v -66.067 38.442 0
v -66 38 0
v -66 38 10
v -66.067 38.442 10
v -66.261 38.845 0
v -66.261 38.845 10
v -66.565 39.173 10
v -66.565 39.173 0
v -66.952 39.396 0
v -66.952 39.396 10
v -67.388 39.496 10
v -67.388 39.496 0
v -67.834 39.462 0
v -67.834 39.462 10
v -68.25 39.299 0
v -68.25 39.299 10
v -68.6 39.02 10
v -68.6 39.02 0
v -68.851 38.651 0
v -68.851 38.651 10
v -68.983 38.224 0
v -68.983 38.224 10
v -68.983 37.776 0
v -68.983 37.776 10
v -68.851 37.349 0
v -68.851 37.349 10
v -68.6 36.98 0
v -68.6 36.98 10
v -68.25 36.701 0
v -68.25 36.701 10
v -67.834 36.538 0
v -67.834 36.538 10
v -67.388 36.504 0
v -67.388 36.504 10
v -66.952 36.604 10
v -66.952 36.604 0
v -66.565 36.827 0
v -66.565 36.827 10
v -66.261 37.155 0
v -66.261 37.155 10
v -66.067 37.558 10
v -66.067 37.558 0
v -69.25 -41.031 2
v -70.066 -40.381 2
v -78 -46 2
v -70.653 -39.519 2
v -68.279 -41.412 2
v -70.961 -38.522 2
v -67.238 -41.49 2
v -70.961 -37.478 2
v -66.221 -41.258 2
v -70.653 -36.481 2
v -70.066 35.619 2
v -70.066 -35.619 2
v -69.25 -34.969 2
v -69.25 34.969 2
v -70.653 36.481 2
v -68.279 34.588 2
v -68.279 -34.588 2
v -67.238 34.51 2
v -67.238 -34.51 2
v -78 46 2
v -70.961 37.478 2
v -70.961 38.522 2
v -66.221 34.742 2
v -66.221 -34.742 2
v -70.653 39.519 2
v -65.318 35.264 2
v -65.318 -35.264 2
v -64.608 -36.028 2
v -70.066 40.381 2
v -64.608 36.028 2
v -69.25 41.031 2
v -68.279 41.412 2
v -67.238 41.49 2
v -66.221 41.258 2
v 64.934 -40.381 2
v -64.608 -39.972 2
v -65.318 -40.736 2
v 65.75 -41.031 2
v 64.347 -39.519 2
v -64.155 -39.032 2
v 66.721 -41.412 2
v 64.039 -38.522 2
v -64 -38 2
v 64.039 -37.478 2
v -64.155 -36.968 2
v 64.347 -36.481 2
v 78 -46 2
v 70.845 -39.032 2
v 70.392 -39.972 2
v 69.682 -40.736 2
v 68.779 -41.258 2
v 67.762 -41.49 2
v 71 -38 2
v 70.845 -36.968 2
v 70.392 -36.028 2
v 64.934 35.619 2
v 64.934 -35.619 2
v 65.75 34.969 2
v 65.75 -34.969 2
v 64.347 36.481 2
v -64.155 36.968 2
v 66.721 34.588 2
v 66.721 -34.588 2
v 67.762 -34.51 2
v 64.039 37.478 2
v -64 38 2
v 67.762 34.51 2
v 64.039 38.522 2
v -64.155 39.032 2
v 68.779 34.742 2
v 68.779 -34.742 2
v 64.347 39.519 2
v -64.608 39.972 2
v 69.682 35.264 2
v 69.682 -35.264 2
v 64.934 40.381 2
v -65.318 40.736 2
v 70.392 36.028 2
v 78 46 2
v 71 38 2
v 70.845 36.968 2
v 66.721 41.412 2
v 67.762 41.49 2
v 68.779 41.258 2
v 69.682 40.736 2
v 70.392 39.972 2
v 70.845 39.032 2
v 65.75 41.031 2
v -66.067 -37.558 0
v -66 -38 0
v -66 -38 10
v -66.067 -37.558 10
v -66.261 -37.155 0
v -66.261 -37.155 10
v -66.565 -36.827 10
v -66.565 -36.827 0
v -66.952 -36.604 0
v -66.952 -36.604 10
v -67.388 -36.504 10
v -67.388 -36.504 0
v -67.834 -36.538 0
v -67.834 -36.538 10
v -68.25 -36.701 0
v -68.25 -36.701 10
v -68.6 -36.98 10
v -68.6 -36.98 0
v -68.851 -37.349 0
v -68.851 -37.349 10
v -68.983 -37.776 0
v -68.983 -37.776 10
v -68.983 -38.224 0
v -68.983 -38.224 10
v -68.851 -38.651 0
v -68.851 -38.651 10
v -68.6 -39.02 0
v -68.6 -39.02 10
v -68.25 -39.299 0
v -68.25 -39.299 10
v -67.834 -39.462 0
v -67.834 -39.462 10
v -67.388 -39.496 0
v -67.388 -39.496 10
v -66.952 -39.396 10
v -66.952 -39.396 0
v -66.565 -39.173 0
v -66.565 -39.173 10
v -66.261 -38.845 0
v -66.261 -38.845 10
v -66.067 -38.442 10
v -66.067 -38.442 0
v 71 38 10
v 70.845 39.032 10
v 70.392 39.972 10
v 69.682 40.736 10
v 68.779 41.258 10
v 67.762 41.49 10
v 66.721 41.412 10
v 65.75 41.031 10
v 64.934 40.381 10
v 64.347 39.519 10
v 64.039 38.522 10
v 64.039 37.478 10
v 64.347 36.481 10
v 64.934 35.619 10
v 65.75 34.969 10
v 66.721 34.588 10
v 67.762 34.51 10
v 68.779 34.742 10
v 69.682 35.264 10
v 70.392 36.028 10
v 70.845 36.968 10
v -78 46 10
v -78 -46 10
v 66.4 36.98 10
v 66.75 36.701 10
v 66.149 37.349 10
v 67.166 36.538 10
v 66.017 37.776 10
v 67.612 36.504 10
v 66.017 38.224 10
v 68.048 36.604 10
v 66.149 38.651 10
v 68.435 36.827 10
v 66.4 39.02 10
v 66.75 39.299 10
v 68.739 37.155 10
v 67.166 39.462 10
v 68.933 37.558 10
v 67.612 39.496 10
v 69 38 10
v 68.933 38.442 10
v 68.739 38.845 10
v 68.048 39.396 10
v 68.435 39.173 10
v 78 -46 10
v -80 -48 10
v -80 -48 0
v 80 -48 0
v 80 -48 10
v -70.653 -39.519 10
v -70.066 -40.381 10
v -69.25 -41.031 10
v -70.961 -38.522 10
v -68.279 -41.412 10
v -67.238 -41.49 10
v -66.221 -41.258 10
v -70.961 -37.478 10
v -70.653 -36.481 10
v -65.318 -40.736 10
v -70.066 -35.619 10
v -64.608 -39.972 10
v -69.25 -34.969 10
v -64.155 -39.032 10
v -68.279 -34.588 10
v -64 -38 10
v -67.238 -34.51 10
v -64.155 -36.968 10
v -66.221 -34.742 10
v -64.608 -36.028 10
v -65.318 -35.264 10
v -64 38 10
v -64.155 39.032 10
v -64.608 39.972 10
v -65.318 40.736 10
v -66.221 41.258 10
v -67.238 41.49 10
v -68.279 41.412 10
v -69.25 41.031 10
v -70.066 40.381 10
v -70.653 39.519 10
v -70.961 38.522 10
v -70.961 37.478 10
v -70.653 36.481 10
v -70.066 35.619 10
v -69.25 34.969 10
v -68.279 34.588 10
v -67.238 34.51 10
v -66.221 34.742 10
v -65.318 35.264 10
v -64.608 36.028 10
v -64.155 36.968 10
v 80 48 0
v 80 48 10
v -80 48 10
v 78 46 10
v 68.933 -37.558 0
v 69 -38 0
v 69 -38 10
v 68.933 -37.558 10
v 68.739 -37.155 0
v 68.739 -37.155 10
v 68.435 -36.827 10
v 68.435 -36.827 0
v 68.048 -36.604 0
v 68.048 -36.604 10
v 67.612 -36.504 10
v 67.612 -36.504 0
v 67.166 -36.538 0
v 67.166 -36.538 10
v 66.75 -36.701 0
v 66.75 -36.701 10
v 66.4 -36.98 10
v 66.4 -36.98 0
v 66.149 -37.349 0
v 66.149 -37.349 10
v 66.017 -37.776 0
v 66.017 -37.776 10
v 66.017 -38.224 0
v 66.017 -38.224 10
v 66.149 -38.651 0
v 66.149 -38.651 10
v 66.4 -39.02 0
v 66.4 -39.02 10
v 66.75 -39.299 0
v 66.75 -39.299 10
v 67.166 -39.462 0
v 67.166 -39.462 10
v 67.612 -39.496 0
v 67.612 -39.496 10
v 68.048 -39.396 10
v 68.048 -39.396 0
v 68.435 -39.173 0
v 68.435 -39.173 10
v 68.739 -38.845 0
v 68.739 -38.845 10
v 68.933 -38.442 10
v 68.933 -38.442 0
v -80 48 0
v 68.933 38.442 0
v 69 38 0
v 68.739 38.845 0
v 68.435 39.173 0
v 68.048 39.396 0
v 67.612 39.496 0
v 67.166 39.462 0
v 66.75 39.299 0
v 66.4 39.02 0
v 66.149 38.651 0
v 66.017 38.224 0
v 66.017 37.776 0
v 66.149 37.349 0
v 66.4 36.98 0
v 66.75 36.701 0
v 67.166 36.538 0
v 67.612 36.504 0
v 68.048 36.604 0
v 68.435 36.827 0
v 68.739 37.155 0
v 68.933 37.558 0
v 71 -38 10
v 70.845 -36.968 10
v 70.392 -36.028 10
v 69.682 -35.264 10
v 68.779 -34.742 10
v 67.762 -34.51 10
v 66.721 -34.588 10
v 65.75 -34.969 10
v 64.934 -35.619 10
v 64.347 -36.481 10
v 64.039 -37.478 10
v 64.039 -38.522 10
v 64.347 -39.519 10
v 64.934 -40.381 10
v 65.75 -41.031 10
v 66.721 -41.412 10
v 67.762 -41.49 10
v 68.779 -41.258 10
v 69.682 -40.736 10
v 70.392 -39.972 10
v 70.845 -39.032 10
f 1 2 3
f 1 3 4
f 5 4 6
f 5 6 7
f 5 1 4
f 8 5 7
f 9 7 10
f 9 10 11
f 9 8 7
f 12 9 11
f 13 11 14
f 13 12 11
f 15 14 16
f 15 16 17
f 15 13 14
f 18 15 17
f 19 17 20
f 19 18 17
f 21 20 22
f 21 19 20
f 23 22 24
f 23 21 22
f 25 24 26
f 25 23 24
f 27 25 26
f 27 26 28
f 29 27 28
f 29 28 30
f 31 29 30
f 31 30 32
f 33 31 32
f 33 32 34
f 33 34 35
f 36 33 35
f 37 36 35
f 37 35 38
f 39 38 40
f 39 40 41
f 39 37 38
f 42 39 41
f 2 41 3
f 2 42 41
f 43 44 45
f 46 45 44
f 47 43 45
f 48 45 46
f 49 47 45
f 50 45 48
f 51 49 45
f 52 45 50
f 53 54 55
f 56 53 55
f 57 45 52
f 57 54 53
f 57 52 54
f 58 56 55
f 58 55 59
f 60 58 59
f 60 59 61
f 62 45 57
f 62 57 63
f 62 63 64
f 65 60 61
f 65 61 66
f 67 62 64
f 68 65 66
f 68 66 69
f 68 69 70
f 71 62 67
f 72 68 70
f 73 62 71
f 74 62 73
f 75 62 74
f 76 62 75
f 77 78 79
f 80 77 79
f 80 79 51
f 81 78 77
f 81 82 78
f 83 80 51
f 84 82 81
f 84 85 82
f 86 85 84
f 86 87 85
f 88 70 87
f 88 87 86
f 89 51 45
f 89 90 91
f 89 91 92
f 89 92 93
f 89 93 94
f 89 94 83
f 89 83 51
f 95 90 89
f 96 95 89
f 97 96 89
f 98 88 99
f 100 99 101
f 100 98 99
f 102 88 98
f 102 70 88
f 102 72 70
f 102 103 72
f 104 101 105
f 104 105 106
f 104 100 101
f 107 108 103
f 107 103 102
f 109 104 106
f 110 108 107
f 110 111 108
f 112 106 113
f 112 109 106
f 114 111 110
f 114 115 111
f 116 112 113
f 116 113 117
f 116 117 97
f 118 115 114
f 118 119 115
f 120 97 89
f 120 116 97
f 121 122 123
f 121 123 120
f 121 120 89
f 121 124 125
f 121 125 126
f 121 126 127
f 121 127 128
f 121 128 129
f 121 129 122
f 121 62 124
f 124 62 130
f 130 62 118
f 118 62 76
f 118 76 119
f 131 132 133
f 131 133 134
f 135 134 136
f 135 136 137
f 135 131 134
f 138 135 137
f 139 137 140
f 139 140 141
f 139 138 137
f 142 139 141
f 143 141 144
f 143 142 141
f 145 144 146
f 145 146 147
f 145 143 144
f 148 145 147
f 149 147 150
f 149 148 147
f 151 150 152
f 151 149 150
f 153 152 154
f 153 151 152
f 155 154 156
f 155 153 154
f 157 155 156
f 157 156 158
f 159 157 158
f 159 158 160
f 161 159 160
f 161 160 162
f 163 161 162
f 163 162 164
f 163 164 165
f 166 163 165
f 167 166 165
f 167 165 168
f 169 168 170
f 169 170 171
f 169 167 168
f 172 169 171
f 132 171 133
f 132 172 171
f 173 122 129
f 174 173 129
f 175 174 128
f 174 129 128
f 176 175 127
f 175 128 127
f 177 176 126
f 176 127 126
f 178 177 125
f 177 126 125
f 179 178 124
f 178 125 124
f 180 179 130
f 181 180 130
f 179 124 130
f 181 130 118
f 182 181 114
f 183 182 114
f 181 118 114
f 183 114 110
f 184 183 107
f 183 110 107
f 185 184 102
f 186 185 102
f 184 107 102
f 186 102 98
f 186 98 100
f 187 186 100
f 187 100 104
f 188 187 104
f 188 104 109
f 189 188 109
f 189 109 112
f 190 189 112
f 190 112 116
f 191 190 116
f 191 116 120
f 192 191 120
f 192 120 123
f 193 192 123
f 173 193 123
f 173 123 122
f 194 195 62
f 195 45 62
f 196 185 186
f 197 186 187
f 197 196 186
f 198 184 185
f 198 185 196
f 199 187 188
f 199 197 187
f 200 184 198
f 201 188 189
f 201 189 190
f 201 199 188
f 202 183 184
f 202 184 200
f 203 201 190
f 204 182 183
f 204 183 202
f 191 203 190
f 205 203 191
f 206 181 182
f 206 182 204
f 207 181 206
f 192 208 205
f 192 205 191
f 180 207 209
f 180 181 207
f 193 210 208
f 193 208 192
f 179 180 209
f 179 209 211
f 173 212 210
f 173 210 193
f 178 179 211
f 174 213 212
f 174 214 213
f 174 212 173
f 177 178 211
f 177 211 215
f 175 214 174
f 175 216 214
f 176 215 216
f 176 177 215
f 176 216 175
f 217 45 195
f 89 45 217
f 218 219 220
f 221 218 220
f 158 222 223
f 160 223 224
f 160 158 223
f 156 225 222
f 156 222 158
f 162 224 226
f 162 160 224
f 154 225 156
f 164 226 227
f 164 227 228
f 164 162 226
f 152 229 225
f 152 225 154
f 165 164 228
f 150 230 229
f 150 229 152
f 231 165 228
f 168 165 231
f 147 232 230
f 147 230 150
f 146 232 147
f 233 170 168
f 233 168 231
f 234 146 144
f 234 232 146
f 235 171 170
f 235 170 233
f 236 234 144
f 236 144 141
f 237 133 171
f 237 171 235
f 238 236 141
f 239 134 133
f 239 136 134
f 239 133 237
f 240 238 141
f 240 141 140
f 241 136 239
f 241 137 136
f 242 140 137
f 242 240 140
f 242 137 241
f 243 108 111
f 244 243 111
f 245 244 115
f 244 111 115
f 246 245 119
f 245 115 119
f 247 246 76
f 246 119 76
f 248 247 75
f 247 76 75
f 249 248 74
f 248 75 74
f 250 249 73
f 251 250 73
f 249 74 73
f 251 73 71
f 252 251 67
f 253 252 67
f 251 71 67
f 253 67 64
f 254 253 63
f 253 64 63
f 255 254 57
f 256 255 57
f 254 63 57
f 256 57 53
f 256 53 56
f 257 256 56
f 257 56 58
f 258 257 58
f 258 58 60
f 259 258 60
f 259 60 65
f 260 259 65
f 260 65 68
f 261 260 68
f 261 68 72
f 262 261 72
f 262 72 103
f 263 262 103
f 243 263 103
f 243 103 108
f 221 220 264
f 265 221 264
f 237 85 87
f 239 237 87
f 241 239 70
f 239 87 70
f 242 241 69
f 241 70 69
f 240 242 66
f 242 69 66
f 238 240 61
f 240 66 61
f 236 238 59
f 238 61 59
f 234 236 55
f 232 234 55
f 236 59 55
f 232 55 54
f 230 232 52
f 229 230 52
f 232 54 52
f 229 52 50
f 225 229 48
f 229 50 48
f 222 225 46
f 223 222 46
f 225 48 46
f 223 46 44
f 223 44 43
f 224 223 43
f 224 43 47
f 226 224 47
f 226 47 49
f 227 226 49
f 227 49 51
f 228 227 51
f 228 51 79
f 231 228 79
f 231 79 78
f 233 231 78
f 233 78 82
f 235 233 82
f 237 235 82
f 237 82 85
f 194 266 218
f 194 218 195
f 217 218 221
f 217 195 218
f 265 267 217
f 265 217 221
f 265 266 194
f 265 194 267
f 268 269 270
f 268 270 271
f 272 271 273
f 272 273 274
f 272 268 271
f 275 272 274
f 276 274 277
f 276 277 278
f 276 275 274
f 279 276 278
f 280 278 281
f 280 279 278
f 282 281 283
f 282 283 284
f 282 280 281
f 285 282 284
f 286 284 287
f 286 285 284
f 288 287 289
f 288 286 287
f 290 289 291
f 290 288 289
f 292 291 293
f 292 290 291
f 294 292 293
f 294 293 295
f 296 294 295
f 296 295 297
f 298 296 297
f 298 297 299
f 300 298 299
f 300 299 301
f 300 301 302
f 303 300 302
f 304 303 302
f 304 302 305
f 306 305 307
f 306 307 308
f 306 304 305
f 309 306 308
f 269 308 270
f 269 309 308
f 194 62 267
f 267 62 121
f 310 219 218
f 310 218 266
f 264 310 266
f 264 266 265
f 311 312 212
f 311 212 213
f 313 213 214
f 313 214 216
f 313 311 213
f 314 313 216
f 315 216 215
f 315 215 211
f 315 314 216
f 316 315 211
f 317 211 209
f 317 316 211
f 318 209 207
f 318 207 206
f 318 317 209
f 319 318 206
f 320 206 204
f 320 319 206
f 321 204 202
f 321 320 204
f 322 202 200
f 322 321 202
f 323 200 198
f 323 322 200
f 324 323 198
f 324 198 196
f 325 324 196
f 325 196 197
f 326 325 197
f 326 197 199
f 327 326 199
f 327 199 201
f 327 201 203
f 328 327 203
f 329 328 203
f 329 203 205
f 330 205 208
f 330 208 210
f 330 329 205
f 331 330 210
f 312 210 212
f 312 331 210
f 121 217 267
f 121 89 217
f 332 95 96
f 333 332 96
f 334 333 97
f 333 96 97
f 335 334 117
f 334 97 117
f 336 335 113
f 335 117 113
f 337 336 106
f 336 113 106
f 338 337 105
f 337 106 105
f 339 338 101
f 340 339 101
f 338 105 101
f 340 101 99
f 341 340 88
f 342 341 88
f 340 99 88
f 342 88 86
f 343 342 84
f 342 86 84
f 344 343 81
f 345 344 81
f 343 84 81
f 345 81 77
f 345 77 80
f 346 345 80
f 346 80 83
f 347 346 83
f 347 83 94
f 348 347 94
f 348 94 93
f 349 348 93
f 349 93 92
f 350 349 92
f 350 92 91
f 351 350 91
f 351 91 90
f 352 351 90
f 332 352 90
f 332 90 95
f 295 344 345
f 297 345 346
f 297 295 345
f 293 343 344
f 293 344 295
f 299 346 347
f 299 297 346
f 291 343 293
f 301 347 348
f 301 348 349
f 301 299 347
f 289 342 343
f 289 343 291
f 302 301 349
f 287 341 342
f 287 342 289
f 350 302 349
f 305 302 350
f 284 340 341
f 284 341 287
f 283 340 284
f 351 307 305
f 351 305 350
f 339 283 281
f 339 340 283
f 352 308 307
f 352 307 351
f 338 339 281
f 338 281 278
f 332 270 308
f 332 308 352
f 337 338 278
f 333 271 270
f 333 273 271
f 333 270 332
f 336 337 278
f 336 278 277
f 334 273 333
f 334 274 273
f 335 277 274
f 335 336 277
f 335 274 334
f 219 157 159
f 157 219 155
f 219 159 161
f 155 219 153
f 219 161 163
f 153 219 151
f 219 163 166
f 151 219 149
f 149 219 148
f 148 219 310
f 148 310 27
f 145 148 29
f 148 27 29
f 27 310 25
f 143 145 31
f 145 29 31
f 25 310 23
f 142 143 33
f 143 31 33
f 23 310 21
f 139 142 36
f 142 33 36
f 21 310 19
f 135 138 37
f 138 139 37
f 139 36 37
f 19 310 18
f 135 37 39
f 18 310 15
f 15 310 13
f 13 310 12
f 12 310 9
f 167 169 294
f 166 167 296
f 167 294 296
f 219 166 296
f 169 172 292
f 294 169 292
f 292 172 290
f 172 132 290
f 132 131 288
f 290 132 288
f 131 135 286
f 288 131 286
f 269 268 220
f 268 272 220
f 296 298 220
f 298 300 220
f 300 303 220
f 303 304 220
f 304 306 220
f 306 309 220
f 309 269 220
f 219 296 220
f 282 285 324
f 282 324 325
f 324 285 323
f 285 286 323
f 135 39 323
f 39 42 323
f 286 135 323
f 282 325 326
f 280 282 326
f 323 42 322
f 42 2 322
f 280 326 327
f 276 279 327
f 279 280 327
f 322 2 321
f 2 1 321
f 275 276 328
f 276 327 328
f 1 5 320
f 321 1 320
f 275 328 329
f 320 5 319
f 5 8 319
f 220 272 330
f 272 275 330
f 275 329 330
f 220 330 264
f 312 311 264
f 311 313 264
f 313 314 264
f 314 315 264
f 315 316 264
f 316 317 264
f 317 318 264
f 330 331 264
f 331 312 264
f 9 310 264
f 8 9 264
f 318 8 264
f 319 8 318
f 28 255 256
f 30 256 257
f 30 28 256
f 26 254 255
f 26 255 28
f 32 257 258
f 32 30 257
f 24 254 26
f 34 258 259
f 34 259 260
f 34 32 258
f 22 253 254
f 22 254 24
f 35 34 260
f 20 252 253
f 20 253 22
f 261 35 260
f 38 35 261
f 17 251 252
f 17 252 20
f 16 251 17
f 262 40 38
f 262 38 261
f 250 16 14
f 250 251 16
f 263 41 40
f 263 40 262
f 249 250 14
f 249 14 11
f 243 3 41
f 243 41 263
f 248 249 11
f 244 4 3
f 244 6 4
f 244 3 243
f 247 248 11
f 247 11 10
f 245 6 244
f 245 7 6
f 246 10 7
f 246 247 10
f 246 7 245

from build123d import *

# Parameters (mm, degrees)
F0_W     = 160
F0_H     = 96
F0_W_2   = 143
F0_H_2   = 84
F0_R     = 1.5
F1_DEPTH = 10
F2_T     = -2


with BuildPart() as f1:
    # F0 (on Top) → F1 (new body)
    with BuildSketch(Plane.XY):
        Rectangle(F0_W, F0_H)
        Rectangle(F0_W_2, F0_H_2, mode=Mode.SUBTRACT)
        Rectangle(F0_W_2, F0_H_2)
        with Locations((-67.5, -38)):
            Circle(F0_R, mode=Mode.SUBTRACT)
        with Locations((67.5, -38)):
            Circle(F0_R, mode=Mode.SUBTRACT)
        with Locations((-67.5, 38)):
            Circle(F0_R, mode=Mode.SUBTRACT)
        with Locations((67.5, 38)):
            Circle(F0_R, mode=Mode.SUBTRACT)
    extrude(amount=F1_DEPTH)

    # F2
    f2_openings = [f1.faces().sort_by_distance(p)[0] for p in [
        (0, 0, 10),
    ]]
    offset(amount=F2_T, openings=f2_openings)


solid = f1.part
